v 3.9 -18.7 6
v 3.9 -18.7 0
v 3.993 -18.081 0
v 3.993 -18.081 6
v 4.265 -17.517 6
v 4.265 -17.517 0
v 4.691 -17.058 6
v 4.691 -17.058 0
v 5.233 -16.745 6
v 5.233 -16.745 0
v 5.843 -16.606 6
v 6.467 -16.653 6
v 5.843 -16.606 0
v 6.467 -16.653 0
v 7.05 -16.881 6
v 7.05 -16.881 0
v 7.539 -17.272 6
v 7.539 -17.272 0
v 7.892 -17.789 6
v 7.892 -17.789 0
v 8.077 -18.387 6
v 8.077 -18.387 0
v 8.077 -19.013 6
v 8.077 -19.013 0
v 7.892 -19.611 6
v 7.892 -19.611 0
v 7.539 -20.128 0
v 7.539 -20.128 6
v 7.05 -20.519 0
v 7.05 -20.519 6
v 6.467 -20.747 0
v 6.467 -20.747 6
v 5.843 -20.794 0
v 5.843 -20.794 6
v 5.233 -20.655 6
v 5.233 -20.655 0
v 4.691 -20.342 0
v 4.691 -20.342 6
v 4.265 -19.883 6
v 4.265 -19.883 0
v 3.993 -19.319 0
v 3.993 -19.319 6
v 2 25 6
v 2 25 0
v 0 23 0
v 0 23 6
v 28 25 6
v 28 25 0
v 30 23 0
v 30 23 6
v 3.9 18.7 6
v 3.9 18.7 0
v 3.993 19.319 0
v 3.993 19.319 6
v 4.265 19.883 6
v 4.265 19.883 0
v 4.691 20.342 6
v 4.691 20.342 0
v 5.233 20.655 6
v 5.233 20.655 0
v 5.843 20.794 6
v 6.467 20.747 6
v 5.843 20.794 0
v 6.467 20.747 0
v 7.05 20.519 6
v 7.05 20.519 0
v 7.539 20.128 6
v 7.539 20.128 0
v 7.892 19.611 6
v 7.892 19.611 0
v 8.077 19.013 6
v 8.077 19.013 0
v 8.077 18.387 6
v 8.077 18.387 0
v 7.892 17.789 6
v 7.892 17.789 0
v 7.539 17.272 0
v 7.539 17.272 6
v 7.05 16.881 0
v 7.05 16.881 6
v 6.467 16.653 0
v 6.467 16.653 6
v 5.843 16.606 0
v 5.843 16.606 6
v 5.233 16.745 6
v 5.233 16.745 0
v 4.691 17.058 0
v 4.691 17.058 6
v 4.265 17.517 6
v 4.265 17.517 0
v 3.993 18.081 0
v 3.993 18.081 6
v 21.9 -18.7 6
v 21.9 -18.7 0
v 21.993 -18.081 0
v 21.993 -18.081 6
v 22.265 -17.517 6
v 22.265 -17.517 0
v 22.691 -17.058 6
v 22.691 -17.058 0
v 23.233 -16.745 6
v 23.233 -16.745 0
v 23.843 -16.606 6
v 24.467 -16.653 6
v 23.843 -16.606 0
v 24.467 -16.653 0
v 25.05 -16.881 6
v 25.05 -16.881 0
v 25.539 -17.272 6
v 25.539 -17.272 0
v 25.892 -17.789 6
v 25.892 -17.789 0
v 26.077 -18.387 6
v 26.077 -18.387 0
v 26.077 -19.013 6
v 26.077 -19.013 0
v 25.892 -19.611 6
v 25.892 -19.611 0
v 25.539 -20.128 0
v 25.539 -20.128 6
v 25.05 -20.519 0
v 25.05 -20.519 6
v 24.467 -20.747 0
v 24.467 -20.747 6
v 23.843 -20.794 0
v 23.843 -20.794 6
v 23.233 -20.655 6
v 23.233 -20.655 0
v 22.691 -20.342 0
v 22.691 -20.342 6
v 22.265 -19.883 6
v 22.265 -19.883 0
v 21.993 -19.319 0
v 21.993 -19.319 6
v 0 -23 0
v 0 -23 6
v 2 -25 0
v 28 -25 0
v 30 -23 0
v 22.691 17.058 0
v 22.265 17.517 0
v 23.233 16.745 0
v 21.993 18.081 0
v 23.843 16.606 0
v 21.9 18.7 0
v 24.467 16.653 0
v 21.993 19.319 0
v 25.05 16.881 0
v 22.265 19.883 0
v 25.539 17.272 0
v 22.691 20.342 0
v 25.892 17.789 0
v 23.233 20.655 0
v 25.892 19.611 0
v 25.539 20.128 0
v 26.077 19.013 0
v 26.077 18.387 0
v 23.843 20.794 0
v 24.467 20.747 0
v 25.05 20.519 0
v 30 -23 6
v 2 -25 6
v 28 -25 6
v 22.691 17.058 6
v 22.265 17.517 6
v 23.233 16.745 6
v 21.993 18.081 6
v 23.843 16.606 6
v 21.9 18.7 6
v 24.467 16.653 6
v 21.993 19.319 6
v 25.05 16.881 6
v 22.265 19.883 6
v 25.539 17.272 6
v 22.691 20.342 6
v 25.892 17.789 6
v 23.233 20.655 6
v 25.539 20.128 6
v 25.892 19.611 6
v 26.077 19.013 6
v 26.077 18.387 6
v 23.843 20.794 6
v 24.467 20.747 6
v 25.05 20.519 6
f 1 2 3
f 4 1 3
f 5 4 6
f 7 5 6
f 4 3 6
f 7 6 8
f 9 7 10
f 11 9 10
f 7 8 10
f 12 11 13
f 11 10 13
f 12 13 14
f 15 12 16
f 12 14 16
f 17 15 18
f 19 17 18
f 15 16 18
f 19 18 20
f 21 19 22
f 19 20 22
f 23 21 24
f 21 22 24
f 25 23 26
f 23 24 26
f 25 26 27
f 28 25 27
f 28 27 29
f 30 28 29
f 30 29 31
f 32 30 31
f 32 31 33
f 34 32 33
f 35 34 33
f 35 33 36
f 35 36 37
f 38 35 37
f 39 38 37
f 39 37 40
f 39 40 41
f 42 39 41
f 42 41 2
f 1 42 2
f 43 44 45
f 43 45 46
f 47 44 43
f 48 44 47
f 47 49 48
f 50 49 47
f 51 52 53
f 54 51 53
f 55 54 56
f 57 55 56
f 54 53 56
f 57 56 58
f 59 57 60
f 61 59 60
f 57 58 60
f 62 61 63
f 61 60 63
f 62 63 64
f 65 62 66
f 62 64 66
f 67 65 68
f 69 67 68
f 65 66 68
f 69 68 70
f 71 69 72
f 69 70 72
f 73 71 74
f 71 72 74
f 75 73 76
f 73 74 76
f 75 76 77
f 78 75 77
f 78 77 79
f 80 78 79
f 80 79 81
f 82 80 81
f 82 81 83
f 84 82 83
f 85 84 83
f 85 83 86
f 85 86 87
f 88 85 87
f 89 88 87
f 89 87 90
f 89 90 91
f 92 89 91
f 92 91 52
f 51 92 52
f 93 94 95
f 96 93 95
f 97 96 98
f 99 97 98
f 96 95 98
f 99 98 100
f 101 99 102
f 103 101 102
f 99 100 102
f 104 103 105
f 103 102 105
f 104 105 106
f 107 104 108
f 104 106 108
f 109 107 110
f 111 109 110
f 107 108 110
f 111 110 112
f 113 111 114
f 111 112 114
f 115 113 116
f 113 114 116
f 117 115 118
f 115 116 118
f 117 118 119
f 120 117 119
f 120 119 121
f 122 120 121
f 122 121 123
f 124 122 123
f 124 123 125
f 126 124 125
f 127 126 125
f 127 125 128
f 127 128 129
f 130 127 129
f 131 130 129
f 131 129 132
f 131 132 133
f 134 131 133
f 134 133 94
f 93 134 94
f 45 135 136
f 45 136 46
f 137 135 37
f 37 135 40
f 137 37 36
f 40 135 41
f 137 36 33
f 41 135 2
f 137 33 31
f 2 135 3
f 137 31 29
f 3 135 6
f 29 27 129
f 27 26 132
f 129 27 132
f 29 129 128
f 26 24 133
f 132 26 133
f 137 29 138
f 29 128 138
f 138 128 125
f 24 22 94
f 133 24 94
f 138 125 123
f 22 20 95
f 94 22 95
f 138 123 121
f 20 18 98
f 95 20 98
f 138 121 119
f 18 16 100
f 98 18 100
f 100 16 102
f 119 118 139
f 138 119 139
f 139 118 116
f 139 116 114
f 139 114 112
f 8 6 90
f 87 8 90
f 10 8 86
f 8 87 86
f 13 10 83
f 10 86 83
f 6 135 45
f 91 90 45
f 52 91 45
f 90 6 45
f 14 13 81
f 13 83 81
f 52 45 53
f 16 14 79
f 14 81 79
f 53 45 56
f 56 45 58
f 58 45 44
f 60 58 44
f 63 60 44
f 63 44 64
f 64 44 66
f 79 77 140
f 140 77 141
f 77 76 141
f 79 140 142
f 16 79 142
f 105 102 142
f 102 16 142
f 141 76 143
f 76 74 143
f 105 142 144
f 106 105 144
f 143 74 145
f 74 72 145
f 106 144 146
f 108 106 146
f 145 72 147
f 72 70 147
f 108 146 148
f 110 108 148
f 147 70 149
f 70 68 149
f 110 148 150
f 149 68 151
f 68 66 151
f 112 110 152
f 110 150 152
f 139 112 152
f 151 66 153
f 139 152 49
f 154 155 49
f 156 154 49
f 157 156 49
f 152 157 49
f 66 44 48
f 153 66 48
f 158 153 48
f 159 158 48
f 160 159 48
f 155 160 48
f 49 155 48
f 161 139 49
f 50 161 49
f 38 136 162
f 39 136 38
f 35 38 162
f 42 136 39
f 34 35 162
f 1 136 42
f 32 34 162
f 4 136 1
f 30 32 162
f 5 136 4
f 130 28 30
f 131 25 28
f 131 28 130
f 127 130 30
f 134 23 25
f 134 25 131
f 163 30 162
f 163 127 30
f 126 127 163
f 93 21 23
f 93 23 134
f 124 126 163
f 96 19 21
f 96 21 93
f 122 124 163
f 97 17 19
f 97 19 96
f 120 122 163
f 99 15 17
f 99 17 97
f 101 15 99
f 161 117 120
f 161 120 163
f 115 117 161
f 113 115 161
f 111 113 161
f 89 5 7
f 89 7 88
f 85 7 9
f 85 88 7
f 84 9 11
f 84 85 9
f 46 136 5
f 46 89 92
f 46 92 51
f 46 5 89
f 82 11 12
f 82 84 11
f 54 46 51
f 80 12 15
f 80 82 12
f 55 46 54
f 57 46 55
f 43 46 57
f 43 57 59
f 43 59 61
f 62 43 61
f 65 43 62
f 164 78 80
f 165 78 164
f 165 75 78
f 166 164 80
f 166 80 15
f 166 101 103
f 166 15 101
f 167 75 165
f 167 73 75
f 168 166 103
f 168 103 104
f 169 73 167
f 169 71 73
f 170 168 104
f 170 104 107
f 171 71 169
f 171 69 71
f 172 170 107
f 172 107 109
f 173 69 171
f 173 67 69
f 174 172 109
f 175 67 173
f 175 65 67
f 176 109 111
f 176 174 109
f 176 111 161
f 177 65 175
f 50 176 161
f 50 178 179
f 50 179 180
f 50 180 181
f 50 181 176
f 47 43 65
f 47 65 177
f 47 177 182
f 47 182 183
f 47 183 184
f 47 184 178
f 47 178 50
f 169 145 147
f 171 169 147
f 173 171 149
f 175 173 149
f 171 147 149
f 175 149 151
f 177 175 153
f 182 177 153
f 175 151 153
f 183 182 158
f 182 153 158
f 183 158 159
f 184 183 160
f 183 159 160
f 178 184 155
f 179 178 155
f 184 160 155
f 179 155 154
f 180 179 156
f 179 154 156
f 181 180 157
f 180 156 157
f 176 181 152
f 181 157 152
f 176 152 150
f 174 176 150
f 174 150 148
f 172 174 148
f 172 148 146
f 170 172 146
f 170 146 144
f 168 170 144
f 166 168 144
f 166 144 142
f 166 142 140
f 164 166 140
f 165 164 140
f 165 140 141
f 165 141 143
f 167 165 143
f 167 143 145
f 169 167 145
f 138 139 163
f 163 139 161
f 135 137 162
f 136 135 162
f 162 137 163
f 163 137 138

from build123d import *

# Parameters (mm, degrees)
SKETCH1_W             = 30
SKETCH1_H             = 50
BOSS_EXTRUDE1_DEPTH   = 6
M5X0_8_TAPPED_HOLE1_D = 4.2
CHAMFER1_SIZE         = 2


with BuildPart() as part:
    # Sketch1 → Boss-Extrude1 (new body)
    with BuildSketch(Plane.XY):
        with Locations((15, 0)):
            Rectangle(SKETCH1_W, SKETCH1_H)
    extrude(amount=BOSS_EXTRUDE1_DEPTH)

    # M5x0.8 Tapped Hole1 (through all)
    with Locations(Plane.XY.offset(6)):
        with Locations((6, 18.7), (6, -18.7), (24, -18.7), (24, 18.7)):
            Hole(M5X0_8_TAPPED_HOLE1_D / 2)

    # Chamfer1
    chamfer1_edges = [part.edges().sort_by_distance(p)[0] for p in [
        (0, 25, 3),
        (30, 25, 3),
        (30, -25, 3),
        (0, -25, 3),
    ]]
    chamfer(chamfer1_edges, length=CHAMFER1_SIZE)


solid = part.part
